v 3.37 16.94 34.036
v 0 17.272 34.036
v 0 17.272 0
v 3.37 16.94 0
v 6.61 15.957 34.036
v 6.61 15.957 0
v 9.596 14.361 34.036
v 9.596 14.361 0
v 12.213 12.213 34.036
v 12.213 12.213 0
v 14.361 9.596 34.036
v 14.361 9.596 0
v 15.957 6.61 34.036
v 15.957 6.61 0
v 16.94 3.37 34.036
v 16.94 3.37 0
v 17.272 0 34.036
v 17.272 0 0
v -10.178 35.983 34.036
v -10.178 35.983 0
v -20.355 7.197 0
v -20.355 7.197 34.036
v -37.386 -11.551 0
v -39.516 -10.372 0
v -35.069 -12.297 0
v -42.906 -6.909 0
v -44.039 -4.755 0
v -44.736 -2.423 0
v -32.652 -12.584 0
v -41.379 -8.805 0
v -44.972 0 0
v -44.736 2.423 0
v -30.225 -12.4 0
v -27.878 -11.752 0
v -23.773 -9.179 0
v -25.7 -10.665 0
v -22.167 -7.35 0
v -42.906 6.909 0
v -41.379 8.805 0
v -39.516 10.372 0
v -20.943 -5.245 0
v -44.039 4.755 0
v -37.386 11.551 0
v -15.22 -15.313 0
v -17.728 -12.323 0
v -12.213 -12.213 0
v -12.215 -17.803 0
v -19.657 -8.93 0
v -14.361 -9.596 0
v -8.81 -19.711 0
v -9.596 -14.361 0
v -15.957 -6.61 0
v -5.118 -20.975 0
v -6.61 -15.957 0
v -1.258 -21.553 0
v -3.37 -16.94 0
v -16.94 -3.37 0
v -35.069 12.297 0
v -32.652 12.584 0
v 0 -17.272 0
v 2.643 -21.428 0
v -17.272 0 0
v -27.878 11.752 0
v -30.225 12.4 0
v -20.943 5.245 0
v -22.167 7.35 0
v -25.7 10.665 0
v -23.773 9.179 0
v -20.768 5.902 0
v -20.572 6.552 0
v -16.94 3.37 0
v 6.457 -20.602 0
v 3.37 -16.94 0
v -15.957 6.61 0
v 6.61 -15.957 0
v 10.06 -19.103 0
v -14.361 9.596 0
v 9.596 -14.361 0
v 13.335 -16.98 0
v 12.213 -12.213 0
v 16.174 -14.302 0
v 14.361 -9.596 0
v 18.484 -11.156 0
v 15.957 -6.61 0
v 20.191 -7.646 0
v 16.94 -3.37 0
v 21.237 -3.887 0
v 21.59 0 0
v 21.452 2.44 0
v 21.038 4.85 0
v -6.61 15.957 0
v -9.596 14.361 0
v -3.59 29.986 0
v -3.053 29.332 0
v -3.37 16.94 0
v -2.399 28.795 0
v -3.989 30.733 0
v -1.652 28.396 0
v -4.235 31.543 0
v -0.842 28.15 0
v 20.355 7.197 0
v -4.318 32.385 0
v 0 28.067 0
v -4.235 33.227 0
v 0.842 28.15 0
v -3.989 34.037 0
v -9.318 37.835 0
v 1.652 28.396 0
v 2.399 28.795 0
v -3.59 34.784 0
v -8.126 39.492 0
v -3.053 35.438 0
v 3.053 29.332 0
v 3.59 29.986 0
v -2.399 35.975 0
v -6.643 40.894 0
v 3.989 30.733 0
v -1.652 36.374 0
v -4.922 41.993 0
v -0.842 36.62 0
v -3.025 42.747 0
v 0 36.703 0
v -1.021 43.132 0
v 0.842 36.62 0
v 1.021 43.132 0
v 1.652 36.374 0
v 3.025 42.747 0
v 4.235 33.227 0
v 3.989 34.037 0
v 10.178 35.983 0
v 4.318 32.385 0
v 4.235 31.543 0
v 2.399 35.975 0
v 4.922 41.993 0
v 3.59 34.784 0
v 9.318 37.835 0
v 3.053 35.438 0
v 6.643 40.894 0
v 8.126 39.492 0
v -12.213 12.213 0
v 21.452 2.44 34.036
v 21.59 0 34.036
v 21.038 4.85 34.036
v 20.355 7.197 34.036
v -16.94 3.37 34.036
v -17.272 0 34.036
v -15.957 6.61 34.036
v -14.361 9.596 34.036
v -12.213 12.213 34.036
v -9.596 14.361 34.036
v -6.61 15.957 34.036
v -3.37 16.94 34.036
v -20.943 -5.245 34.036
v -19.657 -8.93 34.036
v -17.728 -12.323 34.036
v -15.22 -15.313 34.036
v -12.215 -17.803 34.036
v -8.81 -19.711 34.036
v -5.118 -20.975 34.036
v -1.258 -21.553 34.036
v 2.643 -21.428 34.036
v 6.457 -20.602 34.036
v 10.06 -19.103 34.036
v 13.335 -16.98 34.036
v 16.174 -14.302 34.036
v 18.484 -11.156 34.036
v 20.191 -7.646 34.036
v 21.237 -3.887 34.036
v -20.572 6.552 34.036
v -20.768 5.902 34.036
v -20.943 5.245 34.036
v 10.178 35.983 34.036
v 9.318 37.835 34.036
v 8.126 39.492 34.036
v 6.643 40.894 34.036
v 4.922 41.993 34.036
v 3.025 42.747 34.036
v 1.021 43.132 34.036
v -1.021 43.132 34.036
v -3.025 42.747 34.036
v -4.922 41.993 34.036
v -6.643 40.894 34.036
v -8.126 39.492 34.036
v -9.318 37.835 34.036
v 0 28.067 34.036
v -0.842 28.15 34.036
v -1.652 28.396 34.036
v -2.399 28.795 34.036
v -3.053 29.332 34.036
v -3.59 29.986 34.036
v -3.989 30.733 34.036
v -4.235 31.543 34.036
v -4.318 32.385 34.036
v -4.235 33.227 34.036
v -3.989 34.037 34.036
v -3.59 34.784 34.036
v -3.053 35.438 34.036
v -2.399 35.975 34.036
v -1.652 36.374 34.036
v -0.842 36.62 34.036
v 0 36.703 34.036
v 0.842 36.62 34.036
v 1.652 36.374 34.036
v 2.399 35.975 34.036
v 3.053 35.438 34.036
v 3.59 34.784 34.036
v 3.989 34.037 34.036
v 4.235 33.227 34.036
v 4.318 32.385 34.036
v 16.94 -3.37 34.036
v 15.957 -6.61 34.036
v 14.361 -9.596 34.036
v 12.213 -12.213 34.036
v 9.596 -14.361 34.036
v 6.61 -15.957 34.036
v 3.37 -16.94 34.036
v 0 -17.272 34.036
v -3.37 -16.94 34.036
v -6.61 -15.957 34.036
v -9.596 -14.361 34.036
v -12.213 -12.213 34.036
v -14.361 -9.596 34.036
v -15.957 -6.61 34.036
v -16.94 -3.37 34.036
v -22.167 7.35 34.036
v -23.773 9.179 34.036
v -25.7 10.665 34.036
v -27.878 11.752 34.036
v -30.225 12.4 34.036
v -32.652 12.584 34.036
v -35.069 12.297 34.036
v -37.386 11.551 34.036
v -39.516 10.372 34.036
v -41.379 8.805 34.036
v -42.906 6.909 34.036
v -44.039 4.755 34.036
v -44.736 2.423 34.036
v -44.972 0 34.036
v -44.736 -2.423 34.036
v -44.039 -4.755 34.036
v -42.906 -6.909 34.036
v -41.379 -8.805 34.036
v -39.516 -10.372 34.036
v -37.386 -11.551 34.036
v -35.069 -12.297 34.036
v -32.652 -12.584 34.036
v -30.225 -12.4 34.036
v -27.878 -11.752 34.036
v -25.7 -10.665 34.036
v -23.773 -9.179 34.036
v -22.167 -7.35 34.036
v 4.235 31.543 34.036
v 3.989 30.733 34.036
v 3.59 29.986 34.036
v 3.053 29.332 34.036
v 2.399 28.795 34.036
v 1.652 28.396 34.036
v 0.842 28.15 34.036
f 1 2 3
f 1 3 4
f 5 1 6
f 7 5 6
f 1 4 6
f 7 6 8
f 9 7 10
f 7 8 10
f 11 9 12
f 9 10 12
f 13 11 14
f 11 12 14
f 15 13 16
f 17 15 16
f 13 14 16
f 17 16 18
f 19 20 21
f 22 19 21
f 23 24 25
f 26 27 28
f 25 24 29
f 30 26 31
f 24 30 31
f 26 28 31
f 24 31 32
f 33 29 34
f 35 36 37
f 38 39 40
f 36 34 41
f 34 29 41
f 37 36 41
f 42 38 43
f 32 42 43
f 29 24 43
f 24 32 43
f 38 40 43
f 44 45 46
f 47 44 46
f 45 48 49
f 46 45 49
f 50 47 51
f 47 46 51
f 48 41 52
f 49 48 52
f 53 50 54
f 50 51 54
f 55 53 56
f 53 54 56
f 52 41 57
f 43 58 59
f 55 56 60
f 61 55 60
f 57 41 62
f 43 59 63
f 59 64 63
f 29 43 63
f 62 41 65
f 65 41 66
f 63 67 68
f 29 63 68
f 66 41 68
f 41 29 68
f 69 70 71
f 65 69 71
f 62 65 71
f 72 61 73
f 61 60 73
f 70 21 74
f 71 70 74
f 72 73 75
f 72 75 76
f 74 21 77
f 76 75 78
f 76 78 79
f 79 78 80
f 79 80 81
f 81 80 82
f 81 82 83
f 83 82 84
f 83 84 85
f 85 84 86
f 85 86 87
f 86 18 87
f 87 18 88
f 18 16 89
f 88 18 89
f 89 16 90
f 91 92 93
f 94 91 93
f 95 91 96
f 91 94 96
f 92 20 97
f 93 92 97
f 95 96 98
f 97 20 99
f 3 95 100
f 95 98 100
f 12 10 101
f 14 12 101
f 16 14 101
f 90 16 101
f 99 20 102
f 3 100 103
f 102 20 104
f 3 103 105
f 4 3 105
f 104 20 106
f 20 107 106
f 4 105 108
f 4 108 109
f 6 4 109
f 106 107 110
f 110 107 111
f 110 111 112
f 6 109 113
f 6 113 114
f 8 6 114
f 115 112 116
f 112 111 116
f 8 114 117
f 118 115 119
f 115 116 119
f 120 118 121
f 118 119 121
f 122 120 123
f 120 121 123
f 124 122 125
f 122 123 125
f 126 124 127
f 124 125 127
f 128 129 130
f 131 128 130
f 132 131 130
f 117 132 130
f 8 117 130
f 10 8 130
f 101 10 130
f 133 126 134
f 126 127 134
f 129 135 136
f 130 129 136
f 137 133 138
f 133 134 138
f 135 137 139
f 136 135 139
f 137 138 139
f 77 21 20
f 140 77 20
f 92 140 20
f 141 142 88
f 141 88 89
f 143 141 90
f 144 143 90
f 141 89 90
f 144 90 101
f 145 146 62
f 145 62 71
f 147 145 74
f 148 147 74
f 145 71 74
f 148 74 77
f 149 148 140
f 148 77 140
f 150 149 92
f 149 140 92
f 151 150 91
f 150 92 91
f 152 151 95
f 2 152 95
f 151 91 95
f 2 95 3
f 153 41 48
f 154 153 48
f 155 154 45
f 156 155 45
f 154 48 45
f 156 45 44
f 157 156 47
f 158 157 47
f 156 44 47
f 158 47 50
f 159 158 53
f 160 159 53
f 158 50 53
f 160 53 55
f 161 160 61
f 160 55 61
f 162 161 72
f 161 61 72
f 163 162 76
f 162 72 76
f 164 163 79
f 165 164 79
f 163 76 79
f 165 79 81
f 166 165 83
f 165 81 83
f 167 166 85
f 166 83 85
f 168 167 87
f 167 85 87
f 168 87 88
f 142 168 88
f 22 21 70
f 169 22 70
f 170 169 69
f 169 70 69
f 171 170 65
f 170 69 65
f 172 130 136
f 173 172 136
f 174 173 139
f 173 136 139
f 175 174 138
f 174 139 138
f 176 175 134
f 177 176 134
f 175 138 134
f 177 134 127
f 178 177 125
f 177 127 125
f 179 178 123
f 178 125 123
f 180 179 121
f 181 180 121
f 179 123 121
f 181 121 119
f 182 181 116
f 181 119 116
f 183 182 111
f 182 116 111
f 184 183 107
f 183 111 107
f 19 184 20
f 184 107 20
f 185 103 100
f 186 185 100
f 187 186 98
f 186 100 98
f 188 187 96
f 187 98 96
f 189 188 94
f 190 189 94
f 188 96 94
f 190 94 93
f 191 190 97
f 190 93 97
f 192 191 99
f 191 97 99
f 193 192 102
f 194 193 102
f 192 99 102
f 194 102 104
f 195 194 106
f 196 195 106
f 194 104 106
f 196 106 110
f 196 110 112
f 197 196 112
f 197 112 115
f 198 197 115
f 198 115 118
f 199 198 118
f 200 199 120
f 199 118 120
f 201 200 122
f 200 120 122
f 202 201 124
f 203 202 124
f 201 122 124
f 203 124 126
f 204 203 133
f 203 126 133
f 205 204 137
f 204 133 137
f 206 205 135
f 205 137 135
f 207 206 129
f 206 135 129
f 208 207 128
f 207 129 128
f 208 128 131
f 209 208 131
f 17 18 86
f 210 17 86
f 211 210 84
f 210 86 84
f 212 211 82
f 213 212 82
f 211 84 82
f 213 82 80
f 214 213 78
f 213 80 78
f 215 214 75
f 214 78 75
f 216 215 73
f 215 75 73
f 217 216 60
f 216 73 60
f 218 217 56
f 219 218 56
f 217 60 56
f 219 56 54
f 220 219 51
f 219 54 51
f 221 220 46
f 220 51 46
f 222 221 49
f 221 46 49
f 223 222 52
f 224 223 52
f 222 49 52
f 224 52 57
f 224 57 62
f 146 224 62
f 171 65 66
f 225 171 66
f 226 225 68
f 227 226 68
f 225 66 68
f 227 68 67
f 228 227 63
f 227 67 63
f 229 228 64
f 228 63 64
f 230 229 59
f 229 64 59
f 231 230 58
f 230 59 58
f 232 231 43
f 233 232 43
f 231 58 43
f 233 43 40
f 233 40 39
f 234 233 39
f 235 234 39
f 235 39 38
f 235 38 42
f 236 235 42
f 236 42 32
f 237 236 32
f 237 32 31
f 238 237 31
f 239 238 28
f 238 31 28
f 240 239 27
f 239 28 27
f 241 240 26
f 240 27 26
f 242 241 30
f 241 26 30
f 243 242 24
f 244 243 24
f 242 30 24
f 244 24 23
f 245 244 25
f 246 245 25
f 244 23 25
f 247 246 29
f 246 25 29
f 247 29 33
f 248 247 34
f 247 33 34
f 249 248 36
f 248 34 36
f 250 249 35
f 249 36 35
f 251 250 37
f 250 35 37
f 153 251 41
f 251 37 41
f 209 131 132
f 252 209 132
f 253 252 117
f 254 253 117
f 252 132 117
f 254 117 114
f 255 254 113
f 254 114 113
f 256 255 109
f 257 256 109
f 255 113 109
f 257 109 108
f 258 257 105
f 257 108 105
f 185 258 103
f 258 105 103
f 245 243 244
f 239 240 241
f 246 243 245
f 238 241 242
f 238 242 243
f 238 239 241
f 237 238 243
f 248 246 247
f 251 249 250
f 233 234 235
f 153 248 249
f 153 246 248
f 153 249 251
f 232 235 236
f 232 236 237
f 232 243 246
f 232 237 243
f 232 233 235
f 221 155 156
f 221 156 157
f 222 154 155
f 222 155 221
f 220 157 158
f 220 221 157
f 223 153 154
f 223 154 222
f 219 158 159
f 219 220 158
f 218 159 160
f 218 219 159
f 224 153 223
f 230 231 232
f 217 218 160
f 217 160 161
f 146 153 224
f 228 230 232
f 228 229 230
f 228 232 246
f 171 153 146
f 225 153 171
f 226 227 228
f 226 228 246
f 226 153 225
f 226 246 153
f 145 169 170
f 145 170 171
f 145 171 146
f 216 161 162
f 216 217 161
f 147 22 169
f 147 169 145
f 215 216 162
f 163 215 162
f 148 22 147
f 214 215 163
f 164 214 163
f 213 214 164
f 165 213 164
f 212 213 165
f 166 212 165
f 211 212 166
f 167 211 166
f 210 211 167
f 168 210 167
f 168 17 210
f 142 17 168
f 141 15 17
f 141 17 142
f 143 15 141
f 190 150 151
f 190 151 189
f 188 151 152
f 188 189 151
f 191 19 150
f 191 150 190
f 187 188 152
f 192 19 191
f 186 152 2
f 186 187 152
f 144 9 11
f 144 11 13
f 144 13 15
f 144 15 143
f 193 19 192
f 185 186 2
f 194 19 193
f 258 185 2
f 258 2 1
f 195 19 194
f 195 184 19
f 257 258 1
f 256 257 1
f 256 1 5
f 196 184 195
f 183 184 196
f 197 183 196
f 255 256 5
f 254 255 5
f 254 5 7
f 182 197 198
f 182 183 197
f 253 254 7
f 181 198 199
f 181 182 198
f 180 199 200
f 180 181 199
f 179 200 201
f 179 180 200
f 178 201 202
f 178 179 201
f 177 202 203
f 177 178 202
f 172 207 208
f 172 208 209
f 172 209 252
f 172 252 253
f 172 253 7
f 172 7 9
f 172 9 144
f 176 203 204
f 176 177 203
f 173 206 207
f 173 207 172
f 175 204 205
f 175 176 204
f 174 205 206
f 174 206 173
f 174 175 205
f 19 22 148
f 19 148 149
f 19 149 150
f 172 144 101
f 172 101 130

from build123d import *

# Parameters (mm, degrees)
F2_DEPTH = 34.036


# Not quite as in the source:
# - a variable given as a bare number and used for a length is read in inches; the dataset says mm whatever the document's units were


with BuildPart() as f2:
    # F1 (on Top) → F2 (new body)
    with BuildSketch(Plane.XY):
        with BuildLine():
            ThreePointArc((-20.9431391397, -5.2452857858), (2.6425107354, -21.4276745592), (21.59, 0))
            ThreePointArc((21.59, 0), (21.2790729029, 3.6509117207), (20.3552472078, 7.1966666667))
            ThreePointArc((20.3552472078, 7.1966666667), (12.4649923156, 17.6281611796), (9.2e-09, 21.59))
            Line((0, 21.59), (0, 17.272))
            ThreePointArc((0, 17.272), (12.2131483247, 12.2131483247), (17.272, 0))
            ThreePointArc((17.272, 0), (0, -17.272), (-17.272, 0))
            Line((-17.272, 0), (-19.7981337132, 0))
            ThreePointArc((-19.7981337132, 0), (-20.0877162422, -2.6844021868), (-20.9431391397, -5.2452857858))
        make_face()
        with BuildLine():
            ThreePointArc((9.2e-09, 21.59), (12.4649923156, 17.6281611796), (20.3552472078, 7.1966666667))
            Line((20.3552472078, 7.1966666667), (10.1776236039, 35.9833333333))
            ThreePointArc((10.1776236039, 35.9833333333), (10.6395364515, 34.2104558603), (10.795, 32.385))
            ThreePointArc((10.795, 32.385), (7.6332177062, 24.7517823004), (9.2e-09, 21.59))
        make_face()
        with BuildLine():
            ThreePointArc((-20.9431391397, 5.2452857858), (-44.9718662868, 0), (-20.9431391397, -5.2452857858))
            ThreePointArc((-20.9431391397, -5.2452857858), (-21.4276745592, -2.6425107354), (-21.59, 0))
            ThreePointArc((-21.59, 0), (-21.4276745592, 2.6425107354), (-20.9431391397, 5.2452857858))
        make_face()
        with BuildLine():
            ThreePointArc((-21.59, 0), (-21.4276745592, -2.6425107354), (-20.9431391397, -5.2452857858))
            ThreePointArc((-20.9431391397, -5.2452857858), (-20.0877162422, -2.6844021868), (-19.7981337132, 0))
            Line((-19.7981337132, 0), (-21.59, 0))
        make_face()
        with BuildLine():
            Line((0, 17.272), (0, 21.59))
            ThreePointArc((9.2e-09, 21.59), (-12.464992308, 17.6281611849), (-20.3552472078, 7.1966666667))
            ThreePointArc((-20.3552472078, 7.1966666667), (-20.6722313881, 6.2279169422), (-20.9431391397, 5.2452857858))
            ThreePointArc((-20.9431391397, 5.2452857858), (-20.0877162422, 2.6844021868), (-19.7981337132, 0))
            Line((-19.7981337132, 0), (-17.272, 0))
            ThreePointArc((-17.272, 0), (-12.2131483247, 12.2131483247), (0, 17.272))
        make_face()
        with BuildLine():
            ThreePointArc((-20.3552472078, 7.1966666667), (-12.464992308, 17.6281611849), (9.2e-09, 21.59))
            ThreePointArc((9.2e-09, 21.59), (-8.8140805884, 26.1525038403), (-10.1776236039, 35.9833333333))
            Line((-10.1776236039, 35.9833333333), (-20.3552472078, 7.1966666667))
        make_face()
        with BuildLine():
            ThreePointArc((-10.1776236039, 35.9833333333), (-8.8140805884, 26.1525038403), (9.2e-09, 21.59))
            ThreePointArc((9.2e-09, 21.59), (7.6332177062, 24.7517823004), (10.795, 32.385))
            ThreePointArc((10.795, 32.385), (10.6395364515, 34.2104558603), (10.1776236039, 35.9833333333))
            ThreePointArc((10.1776236039, 35.9833333333), (0, 43.18), (-10.1776236039, 35.9833333333))
        make_face()
        with BuildLine():
            ThreePointArc((4.318, 32.385), (3.0532870812, 29.3317129188), (0, 28.067))
            ThreePointArc((0, 28.067), (-3.0532870812, 35.4382870812), (4.318, 32.385))
        make_face(mode=Mode.SUBTRACT)
        with BuildLine():
            ThreePointArc((-20.9431391397, 5.2452857858), (-21.4276745592, 2.6425107354), (-21.59, 0))
            Line((-21.59, 0), (-19.7981337132, 0))
            ThreePointArc((-19.7981337132, 0), (-20.0877162422, 2.6844021868), (-20.9431391397, 5.2452857858))
        make_face()
    extrude(amount=F2_DEPTH)


solid = f2.part
